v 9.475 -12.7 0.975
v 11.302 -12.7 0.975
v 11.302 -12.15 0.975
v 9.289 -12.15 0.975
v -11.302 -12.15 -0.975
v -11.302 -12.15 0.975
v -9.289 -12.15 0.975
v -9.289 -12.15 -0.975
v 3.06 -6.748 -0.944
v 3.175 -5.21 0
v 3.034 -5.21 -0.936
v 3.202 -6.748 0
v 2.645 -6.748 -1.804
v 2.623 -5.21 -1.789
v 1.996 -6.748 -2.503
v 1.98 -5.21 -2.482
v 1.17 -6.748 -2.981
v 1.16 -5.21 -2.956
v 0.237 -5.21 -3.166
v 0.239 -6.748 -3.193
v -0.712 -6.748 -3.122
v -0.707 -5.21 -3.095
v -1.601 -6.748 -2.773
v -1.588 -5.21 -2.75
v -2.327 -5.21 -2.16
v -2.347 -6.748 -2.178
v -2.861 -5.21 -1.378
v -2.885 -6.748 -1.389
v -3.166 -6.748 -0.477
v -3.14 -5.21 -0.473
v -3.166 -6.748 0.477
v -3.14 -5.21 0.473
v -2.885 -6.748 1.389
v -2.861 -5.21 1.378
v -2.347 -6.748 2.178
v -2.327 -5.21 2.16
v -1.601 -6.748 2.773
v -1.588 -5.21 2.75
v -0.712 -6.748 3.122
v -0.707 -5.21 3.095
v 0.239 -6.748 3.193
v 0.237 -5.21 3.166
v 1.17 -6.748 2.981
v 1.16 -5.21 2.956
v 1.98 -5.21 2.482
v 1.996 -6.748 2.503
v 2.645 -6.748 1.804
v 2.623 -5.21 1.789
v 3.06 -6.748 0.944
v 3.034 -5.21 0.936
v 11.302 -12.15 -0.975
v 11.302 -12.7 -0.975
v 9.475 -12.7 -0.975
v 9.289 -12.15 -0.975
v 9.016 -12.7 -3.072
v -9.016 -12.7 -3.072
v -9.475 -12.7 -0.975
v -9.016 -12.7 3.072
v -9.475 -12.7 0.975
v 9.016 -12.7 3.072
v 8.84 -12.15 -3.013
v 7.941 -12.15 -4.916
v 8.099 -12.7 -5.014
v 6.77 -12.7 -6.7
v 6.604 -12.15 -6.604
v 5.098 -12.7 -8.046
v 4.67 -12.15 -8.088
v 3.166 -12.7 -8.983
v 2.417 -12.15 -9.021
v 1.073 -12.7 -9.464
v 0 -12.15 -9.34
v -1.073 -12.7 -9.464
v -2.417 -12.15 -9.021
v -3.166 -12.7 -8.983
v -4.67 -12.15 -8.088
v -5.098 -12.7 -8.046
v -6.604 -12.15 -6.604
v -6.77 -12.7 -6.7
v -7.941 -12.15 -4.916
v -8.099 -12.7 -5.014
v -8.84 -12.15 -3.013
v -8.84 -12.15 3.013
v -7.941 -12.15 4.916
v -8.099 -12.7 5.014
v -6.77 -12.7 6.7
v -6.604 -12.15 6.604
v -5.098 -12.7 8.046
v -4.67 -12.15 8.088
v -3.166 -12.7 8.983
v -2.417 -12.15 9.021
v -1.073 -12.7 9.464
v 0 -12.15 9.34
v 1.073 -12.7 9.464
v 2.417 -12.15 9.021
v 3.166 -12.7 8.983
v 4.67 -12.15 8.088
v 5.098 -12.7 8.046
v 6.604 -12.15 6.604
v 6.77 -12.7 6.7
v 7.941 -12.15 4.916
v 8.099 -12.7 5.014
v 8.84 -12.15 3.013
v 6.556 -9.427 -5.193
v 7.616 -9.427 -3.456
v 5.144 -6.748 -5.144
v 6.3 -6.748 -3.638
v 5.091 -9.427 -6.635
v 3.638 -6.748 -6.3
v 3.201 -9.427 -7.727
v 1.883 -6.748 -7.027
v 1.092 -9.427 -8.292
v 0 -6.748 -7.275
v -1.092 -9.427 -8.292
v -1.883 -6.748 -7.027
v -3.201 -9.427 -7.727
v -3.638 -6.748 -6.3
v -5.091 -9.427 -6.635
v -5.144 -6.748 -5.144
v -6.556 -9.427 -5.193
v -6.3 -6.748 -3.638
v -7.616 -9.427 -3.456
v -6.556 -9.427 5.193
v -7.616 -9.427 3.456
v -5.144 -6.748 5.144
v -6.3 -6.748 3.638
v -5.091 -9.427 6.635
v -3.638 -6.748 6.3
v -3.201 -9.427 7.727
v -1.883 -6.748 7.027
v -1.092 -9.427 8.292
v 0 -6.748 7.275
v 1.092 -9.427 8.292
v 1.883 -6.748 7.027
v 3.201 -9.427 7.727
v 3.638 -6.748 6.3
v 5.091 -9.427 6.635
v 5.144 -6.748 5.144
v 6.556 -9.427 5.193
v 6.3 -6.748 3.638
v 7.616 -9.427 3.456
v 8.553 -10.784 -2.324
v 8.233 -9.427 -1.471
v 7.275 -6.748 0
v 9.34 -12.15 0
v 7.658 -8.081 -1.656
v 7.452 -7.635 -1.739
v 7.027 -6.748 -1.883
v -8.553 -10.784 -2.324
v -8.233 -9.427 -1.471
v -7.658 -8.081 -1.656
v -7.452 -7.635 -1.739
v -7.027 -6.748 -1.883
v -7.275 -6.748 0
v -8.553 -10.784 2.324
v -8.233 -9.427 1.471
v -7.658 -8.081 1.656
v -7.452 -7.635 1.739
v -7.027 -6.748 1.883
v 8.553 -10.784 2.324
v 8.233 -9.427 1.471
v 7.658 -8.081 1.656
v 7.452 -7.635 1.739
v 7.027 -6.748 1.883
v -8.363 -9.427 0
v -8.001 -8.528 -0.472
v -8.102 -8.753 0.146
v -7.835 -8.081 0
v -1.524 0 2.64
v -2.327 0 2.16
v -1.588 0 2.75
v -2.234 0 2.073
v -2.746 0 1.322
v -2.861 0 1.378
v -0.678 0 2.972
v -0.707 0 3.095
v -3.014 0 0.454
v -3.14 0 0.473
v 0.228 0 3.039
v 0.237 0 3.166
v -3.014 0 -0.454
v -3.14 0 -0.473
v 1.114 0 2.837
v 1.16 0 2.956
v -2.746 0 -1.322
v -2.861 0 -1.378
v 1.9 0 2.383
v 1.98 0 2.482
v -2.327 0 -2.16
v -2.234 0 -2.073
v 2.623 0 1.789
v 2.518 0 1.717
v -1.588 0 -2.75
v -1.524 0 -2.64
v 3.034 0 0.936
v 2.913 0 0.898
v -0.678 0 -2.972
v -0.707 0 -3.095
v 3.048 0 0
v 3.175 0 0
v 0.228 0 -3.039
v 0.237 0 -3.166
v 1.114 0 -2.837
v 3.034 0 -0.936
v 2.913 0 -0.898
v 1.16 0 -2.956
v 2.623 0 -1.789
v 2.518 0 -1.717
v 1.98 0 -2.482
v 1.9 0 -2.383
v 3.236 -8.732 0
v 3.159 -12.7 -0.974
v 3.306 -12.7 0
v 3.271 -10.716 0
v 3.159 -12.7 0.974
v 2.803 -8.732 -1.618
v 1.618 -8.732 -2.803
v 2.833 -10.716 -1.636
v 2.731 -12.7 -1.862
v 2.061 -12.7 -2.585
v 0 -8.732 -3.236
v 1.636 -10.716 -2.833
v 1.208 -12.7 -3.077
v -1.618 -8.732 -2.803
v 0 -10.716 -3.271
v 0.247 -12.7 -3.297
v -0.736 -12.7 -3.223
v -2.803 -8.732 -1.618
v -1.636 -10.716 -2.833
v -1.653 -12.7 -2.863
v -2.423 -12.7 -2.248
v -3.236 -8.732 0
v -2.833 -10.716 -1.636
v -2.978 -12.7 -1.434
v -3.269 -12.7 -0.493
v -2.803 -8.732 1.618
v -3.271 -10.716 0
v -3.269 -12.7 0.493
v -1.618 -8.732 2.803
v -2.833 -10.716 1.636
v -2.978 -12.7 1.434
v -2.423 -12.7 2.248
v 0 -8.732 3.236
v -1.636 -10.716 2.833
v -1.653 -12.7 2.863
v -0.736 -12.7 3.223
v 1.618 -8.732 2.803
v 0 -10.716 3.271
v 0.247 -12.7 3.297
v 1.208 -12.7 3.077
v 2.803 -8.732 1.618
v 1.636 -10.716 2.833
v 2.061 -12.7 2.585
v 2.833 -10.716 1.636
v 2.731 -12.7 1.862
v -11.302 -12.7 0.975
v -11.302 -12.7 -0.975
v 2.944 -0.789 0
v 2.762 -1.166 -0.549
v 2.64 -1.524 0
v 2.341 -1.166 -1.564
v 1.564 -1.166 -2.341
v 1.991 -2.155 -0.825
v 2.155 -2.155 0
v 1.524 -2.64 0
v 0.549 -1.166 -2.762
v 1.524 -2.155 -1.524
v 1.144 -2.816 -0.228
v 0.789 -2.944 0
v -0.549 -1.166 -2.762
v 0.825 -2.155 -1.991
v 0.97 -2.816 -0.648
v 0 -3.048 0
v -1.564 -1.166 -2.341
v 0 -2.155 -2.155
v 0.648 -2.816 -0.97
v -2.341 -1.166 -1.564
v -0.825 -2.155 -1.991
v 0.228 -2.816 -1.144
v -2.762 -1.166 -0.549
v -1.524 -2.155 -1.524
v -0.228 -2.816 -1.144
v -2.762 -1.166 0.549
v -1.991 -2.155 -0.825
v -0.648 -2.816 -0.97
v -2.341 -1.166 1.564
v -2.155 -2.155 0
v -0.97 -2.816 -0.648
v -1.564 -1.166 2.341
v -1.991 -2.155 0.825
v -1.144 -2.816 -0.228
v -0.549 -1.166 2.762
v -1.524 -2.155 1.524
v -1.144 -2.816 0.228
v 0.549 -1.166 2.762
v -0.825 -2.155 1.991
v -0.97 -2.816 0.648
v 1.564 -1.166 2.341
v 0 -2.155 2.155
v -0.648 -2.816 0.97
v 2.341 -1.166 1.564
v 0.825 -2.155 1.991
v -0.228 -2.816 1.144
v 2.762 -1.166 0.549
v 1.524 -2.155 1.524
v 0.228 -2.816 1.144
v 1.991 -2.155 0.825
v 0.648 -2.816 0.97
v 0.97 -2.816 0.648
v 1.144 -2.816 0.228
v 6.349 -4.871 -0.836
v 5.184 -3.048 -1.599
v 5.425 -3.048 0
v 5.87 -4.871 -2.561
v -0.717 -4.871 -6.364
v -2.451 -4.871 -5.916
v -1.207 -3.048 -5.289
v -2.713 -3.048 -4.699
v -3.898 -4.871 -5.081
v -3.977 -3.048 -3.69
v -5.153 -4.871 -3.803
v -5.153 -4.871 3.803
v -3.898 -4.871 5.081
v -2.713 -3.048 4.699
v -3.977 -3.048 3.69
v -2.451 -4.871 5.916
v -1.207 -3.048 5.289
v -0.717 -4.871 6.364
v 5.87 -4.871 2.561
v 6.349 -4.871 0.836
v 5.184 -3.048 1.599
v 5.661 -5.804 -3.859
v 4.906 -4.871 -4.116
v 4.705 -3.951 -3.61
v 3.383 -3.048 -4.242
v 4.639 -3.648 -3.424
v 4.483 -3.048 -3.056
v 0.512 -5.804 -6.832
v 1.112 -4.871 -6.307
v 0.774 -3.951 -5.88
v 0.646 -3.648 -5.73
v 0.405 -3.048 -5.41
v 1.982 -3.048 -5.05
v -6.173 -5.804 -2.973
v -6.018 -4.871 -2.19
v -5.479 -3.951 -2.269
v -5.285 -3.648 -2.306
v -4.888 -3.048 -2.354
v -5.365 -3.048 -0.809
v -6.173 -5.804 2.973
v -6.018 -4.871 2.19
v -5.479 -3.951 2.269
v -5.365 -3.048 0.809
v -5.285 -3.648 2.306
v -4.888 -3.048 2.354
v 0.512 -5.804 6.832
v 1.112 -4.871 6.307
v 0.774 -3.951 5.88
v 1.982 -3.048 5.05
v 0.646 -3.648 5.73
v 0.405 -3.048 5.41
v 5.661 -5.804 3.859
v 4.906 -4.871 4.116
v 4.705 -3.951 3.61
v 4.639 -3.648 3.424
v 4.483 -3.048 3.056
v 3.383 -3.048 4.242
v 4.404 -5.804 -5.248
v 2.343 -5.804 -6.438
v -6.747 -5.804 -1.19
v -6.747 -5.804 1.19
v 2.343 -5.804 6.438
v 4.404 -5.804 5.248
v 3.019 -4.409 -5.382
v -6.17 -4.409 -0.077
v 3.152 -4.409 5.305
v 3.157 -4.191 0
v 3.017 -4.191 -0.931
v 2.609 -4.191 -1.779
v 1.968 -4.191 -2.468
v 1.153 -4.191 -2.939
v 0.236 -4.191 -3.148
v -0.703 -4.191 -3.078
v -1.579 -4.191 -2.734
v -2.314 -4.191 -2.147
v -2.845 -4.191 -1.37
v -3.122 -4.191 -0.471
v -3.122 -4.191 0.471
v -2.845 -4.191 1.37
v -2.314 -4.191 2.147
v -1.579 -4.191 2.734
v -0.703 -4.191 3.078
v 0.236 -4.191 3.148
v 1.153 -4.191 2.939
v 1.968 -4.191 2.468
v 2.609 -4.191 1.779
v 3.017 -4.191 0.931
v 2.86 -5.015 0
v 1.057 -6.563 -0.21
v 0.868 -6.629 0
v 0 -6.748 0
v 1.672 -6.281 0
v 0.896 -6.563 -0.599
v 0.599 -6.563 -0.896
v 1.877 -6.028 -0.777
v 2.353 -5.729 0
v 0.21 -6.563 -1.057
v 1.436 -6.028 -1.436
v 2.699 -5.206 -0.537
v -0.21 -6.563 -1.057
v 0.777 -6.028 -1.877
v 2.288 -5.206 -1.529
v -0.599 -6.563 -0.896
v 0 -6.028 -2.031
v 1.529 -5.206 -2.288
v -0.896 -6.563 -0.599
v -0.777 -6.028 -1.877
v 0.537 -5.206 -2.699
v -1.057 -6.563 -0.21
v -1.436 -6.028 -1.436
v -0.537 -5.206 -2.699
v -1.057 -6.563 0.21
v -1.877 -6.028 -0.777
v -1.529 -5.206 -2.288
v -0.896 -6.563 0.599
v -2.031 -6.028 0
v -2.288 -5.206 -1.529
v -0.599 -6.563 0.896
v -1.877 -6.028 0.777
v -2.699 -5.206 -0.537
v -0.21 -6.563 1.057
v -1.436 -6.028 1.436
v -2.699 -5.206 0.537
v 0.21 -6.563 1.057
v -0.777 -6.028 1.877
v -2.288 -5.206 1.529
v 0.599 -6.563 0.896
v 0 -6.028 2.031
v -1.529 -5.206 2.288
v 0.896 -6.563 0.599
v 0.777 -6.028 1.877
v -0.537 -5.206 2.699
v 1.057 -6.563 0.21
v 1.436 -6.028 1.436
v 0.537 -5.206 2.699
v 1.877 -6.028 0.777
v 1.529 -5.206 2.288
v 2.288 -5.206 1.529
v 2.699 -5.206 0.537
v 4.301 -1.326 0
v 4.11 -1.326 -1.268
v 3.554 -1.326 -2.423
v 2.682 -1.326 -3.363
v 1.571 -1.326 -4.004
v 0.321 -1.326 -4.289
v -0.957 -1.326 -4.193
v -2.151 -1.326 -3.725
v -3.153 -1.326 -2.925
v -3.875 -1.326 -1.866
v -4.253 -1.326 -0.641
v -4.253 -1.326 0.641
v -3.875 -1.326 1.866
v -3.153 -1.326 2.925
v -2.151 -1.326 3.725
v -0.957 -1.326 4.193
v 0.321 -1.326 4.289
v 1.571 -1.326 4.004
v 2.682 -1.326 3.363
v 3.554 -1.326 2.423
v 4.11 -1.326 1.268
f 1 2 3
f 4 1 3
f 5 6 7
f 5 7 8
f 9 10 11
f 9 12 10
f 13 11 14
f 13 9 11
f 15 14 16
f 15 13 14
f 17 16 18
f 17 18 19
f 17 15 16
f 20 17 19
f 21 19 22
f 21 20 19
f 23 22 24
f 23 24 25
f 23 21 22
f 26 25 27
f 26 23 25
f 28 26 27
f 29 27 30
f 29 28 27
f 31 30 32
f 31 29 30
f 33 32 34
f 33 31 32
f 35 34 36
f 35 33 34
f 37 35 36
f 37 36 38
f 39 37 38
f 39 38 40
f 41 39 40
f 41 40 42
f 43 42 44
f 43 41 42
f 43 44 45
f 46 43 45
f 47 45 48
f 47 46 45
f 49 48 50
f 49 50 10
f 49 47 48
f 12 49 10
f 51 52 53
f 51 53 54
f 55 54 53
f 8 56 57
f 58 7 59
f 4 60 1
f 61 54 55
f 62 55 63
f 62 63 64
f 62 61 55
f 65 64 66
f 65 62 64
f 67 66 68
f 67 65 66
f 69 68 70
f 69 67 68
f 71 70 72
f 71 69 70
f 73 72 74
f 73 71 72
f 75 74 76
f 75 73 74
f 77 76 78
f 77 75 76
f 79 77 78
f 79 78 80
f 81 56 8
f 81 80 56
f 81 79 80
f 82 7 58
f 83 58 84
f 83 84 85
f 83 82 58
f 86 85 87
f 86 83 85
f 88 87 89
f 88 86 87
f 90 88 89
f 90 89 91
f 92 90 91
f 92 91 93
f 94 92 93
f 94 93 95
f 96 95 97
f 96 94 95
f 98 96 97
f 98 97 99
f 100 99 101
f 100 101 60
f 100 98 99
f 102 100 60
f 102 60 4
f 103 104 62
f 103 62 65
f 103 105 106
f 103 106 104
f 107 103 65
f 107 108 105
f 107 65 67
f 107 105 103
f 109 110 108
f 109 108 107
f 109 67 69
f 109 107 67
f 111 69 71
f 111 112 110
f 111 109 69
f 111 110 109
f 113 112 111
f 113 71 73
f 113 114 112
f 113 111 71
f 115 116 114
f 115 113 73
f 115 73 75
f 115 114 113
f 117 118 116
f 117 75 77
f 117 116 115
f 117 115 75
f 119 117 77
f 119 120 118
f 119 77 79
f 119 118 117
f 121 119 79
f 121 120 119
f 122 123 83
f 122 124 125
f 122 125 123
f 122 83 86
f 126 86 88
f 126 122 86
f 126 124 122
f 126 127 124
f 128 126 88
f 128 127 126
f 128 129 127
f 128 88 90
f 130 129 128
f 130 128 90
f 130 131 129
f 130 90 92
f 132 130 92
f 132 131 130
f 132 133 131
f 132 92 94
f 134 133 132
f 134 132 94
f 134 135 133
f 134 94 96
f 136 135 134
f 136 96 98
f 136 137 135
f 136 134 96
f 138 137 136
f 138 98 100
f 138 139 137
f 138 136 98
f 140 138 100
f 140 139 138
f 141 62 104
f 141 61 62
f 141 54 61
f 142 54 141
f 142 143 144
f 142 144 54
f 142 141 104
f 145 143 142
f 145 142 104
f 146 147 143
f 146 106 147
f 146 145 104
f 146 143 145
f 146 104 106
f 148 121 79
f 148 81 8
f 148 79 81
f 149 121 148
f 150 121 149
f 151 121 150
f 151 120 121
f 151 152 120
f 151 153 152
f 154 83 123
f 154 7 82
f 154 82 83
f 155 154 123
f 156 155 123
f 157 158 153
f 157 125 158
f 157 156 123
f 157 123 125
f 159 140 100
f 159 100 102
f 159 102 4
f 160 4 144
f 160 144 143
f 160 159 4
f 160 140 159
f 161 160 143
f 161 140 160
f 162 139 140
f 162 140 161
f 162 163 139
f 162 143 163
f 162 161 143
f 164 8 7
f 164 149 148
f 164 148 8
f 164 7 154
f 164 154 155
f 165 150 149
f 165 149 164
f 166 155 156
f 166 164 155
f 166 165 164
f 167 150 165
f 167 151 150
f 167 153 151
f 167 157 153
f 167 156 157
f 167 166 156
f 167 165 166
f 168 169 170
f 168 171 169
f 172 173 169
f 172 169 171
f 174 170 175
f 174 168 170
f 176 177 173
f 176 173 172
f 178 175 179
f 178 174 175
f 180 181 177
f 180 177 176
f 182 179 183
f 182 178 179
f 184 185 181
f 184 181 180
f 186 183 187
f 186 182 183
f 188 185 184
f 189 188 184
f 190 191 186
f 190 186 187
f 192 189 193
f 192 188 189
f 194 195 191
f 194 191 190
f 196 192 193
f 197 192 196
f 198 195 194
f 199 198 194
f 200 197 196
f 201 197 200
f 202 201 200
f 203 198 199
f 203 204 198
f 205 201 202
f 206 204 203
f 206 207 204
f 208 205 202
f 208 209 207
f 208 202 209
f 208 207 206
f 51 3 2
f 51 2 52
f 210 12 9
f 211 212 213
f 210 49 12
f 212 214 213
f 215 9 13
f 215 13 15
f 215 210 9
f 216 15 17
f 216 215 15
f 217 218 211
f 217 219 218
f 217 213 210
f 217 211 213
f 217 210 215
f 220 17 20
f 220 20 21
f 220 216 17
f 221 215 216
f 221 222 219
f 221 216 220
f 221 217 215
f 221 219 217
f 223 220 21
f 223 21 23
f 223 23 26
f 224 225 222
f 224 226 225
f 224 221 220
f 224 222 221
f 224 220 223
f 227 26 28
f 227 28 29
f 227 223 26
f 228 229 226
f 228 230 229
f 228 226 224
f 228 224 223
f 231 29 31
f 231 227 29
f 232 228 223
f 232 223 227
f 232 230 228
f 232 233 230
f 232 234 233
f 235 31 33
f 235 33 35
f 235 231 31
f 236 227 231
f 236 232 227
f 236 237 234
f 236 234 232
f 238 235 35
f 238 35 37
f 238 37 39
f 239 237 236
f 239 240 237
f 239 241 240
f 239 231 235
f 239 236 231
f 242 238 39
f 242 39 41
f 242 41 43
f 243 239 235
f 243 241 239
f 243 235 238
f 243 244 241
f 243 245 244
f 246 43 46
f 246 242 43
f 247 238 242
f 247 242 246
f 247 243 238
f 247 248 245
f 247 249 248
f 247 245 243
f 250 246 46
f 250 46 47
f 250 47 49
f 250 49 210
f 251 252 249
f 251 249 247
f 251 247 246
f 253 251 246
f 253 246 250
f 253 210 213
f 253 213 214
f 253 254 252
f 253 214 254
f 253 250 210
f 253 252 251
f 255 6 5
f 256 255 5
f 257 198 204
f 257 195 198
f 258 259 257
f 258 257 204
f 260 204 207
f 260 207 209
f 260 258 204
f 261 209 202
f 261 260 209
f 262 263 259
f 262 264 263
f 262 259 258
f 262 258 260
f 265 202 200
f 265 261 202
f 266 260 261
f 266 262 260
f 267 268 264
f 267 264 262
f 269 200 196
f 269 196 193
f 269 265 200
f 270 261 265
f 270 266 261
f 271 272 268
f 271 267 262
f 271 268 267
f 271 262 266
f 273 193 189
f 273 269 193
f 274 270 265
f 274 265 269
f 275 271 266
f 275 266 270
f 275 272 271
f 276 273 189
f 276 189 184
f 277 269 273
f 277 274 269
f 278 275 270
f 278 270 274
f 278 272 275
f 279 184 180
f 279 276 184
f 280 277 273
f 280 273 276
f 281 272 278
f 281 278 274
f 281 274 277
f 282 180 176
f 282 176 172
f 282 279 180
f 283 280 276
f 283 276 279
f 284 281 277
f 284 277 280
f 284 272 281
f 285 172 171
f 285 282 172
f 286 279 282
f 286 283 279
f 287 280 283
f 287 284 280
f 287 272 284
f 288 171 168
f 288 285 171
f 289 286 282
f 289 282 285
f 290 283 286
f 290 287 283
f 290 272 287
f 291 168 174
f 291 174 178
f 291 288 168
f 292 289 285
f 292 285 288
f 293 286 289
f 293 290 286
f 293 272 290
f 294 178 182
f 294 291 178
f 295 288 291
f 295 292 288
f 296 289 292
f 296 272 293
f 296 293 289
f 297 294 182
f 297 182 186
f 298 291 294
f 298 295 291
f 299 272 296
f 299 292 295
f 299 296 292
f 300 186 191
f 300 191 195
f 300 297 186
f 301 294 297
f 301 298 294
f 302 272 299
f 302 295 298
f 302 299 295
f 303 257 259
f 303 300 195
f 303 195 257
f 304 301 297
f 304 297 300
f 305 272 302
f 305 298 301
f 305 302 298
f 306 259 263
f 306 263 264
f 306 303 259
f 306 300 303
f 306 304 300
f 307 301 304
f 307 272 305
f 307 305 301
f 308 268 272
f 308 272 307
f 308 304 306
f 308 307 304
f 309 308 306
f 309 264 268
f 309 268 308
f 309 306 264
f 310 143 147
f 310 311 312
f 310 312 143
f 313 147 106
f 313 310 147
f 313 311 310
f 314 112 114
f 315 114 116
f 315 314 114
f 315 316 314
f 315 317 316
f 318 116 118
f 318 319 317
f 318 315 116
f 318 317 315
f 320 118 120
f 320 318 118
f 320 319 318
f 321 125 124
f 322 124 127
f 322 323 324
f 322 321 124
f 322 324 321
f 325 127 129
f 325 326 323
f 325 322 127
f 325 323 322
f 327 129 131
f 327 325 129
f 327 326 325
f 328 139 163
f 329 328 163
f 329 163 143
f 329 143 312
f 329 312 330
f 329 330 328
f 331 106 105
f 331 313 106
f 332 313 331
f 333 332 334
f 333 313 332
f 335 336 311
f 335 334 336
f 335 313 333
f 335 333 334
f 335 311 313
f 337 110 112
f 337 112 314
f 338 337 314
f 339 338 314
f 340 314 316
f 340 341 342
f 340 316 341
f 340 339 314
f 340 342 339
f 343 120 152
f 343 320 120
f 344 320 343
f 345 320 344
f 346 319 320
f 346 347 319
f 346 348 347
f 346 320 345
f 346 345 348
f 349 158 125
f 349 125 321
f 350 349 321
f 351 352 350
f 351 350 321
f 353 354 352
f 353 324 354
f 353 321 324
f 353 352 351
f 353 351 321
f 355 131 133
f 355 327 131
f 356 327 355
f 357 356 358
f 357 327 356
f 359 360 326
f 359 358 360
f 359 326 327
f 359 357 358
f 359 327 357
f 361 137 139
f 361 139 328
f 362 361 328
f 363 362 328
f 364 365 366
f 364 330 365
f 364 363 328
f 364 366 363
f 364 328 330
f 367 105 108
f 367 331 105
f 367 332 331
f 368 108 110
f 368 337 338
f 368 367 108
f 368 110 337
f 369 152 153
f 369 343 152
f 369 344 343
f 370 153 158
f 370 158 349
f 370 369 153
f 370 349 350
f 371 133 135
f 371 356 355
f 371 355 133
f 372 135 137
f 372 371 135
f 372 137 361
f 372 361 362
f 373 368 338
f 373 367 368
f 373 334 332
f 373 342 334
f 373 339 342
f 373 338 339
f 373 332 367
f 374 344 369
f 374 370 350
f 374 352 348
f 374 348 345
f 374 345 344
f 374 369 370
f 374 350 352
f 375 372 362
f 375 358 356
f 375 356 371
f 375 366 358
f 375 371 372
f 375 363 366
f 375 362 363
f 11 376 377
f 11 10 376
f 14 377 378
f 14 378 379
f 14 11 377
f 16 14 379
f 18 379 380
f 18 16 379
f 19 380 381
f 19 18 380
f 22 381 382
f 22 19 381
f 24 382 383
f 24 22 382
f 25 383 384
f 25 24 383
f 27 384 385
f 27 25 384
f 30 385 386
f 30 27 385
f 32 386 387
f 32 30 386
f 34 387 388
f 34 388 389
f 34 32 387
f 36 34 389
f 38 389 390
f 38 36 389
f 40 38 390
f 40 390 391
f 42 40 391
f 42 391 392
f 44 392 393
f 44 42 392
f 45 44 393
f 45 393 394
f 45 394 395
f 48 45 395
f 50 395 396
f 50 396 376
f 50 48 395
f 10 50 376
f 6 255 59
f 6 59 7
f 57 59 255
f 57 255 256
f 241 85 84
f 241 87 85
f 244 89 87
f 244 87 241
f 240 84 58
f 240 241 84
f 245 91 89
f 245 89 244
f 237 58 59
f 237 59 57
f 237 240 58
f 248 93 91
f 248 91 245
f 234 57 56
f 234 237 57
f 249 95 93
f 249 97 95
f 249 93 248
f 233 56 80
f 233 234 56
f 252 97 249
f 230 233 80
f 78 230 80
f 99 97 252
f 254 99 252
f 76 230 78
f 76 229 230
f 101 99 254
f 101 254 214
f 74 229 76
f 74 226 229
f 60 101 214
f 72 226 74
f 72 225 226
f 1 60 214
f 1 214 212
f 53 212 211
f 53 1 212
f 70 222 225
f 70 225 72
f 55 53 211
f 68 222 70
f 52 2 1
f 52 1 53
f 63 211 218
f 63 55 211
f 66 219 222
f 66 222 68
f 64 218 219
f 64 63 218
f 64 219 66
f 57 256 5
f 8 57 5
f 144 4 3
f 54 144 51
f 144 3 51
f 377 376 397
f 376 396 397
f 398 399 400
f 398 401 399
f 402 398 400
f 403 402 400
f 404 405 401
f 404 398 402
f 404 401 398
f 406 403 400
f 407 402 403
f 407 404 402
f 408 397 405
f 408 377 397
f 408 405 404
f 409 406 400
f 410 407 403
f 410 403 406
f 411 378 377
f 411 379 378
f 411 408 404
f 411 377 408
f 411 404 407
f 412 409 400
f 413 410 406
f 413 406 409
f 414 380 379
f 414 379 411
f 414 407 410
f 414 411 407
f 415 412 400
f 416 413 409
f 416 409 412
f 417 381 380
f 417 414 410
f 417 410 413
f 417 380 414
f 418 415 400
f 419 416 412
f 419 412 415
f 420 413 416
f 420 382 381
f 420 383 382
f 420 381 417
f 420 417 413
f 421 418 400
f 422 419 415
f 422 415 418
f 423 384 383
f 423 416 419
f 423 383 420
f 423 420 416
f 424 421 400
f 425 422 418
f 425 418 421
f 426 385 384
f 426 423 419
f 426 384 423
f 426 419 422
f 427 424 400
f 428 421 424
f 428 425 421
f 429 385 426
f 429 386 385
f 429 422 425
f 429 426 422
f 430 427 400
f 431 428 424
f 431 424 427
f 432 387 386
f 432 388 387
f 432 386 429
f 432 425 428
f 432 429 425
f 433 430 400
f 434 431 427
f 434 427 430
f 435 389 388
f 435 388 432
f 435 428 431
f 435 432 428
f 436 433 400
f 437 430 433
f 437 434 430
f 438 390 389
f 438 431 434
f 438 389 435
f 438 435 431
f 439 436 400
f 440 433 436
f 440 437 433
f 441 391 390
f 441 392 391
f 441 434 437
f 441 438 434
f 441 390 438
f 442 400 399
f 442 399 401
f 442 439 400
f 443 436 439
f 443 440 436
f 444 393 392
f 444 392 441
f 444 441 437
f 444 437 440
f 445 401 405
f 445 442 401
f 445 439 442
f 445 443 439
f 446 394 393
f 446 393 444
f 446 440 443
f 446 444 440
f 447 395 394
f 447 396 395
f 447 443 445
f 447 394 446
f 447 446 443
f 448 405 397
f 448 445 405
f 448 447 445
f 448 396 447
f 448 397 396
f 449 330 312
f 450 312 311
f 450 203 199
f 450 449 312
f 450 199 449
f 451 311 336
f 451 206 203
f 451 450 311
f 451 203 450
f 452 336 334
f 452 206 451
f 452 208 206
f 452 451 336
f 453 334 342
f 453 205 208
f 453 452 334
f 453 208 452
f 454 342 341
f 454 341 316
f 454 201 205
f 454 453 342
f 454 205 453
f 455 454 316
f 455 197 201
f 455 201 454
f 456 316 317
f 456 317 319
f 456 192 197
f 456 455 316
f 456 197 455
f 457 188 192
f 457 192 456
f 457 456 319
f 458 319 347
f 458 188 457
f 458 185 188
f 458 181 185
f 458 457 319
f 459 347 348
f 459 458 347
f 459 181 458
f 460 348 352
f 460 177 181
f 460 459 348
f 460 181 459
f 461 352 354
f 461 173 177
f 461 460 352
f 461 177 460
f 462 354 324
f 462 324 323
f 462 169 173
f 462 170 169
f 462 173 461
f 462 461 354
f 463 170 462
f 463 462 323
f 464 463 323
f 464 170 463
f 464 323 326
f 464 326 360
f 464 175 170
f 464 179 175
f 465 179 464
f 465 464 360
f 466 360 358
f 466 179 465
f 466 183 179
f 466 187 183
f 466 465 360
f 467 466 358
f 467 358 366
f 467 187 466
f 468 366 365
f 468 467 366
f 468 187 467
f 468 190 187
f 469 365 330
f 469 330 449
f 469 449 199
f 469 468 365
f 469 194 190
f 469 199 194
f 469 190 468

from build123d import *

# Parameters (mm, degrees)
BOSS_EXTRUDE1_REACH = 28.188
SKETCH6_W           = 1.95
SKETCH6_H           = 0.55


# Read off the part's stored shape, not the designer's step: Revolve1
with BuildPart() as part:
    # Revolve1 outline → Revolve1 (revolve)
    with BuildSketch(Plane.XY):
        with BuildLine():
            Line((0, -3.048000121), (0, -6.747666043))
            ThreePointArc((0, -6.747666043), (2.031291213, -6.02834824), (3.157219843, -4.191000475))
            Line((3.157219843, -4.191000475), (3.175005592, -5.209936836))
            Line((3.175005592, -5.209936836), (3.175005592, -3.048000121))
            Line((3.175005592, -3.048000121), (0, -3.048000121))
        make_face()
        with BuildLine():
            ThreePointArc((3.047999762, -2.63e-07), (2.155261335, -2.155261626), (0, -3.048000121))
            Line((0, -3.048000121), (3.175005592, -3.048000121))
            Line((3.175005592, -3.048000121), (3.175005592, -2.63e-07))
            Line((3.175005592, -2.63e-07), (3.047999762, -2.63e-07))
        make_face()
        with BuildLine():
            Line((3.175005592, -3.048000121), (3.175005592, -5.209936836))
            Line((3.175005592, -5.209936836), (3.201846755, -6.747666043))
            Line((3.201846755, -6.747666043), (7.27518656, -6.747666043))
            add(Edge.make_bspline(
                [(7.27518656, -6.747666043), (7.21368894, -6.606752773), (6.964928048, -6.043911737), (6.546096871, -5.144737962), (6.026061135, -4.11883899), (5.658022957, -3.448984329), (5.463723236, -3.113412693), (5.425444316, -3.048000121)],
                knots=[0.445044946, 0.445044946, 0.445044946, 0.445044946, 0.477293423, 0.574115344, 0.653072781, 0.718507442, 0.734404118, 0.734404118, 0.734404118, 0.734404118], degree=3))
            Line((5.425444316, -3.048000121), (3.175005592, -3.048000121))
        make_face()
        with BuildLine():
            Line((3.175005592, -5.539e-06), (3.175005592, -3.048000121))
            Line((3.175005592, -3.048000121), (5.425444316, -3.048000121))
            add(Edge.make_bspline(
                [(5.425444316, -3.048000121), (5.331276728, -2.887082722), (5.120346092, -2.535848114), (4.796092557, -2.028683173), (4.466086303, -1.548435358), (4.165682257, -1.140937859), (3.890472725, -0.792449825), (3.569506506, -0.412648033), (3.330841371, -0.155867529), (3.175005592, -5.539e-06)],
                knots=[0.734404118, 0.734404118, 0.734404118, 0.734404118, 0.773510539, 0.820333182, 0.86064682, 0.895714403, 0.926505158, 0.95377342, 1, 1, 1, 1], degree=3))
        make_face()
        with BuildLine():
            Line((7.27518656, -6.747666043), (3.201846755, -6.747666043))
            Line((3.201846755, -6.747666043), (3.30574513, -12.7))
            Line((3.30574513, -12.7), (9.524999537, -12.7))
            add(Edge.make_bspline(
                [(9.524999537, -12.7), (8.986589512, -11.088985259), (8.268131113, -9.090761172), (7.444322602, -7.135217838), (7.27518656, -6.747666043)],
                knots=[0, 0, 0, 0, 0.356352413, 0.445044946, 0.445044946, 0.445044946, 0.445044946], degree=3))
        make_face()
    revolve(axis=Axis((0, 0, 0), (0, 1, 0)))

    # Sketch6 → Boss-Extrude1 (add, up to next)
    with BuildSketch(Plane(origin=(11.3025, 0, 0), x_dir=(0, 0, -1), z_dir=(1, 0, 0)), mode=Mode.PRIVATE) as boss_extrude1_sk1:
        with Locations((0, -12.425)):
            Rectangle(SKETCH6_W, SKETCH6_H)
    boss_extrude1_tool1 = extrude(boss_extrude1_sk1.sketch, amount=-BOSS_EXTRUDE1_REACH, mode=Mode.PRIVATE) - part.part
    boss_extrude1 = boss_extrude1_tool1.solids().sort_by_distance((11.3025, -12.425, 0))[0]
    add(boss_extrude1)

    # Mirror1: Boss-Extrude1 across plane
    add(boss_extrude1.mirror(Plane(origin=(0, 0, 0), x_dir=(0, 0, 1), z_dir=(1, 0, 0))))


solid = part.part
